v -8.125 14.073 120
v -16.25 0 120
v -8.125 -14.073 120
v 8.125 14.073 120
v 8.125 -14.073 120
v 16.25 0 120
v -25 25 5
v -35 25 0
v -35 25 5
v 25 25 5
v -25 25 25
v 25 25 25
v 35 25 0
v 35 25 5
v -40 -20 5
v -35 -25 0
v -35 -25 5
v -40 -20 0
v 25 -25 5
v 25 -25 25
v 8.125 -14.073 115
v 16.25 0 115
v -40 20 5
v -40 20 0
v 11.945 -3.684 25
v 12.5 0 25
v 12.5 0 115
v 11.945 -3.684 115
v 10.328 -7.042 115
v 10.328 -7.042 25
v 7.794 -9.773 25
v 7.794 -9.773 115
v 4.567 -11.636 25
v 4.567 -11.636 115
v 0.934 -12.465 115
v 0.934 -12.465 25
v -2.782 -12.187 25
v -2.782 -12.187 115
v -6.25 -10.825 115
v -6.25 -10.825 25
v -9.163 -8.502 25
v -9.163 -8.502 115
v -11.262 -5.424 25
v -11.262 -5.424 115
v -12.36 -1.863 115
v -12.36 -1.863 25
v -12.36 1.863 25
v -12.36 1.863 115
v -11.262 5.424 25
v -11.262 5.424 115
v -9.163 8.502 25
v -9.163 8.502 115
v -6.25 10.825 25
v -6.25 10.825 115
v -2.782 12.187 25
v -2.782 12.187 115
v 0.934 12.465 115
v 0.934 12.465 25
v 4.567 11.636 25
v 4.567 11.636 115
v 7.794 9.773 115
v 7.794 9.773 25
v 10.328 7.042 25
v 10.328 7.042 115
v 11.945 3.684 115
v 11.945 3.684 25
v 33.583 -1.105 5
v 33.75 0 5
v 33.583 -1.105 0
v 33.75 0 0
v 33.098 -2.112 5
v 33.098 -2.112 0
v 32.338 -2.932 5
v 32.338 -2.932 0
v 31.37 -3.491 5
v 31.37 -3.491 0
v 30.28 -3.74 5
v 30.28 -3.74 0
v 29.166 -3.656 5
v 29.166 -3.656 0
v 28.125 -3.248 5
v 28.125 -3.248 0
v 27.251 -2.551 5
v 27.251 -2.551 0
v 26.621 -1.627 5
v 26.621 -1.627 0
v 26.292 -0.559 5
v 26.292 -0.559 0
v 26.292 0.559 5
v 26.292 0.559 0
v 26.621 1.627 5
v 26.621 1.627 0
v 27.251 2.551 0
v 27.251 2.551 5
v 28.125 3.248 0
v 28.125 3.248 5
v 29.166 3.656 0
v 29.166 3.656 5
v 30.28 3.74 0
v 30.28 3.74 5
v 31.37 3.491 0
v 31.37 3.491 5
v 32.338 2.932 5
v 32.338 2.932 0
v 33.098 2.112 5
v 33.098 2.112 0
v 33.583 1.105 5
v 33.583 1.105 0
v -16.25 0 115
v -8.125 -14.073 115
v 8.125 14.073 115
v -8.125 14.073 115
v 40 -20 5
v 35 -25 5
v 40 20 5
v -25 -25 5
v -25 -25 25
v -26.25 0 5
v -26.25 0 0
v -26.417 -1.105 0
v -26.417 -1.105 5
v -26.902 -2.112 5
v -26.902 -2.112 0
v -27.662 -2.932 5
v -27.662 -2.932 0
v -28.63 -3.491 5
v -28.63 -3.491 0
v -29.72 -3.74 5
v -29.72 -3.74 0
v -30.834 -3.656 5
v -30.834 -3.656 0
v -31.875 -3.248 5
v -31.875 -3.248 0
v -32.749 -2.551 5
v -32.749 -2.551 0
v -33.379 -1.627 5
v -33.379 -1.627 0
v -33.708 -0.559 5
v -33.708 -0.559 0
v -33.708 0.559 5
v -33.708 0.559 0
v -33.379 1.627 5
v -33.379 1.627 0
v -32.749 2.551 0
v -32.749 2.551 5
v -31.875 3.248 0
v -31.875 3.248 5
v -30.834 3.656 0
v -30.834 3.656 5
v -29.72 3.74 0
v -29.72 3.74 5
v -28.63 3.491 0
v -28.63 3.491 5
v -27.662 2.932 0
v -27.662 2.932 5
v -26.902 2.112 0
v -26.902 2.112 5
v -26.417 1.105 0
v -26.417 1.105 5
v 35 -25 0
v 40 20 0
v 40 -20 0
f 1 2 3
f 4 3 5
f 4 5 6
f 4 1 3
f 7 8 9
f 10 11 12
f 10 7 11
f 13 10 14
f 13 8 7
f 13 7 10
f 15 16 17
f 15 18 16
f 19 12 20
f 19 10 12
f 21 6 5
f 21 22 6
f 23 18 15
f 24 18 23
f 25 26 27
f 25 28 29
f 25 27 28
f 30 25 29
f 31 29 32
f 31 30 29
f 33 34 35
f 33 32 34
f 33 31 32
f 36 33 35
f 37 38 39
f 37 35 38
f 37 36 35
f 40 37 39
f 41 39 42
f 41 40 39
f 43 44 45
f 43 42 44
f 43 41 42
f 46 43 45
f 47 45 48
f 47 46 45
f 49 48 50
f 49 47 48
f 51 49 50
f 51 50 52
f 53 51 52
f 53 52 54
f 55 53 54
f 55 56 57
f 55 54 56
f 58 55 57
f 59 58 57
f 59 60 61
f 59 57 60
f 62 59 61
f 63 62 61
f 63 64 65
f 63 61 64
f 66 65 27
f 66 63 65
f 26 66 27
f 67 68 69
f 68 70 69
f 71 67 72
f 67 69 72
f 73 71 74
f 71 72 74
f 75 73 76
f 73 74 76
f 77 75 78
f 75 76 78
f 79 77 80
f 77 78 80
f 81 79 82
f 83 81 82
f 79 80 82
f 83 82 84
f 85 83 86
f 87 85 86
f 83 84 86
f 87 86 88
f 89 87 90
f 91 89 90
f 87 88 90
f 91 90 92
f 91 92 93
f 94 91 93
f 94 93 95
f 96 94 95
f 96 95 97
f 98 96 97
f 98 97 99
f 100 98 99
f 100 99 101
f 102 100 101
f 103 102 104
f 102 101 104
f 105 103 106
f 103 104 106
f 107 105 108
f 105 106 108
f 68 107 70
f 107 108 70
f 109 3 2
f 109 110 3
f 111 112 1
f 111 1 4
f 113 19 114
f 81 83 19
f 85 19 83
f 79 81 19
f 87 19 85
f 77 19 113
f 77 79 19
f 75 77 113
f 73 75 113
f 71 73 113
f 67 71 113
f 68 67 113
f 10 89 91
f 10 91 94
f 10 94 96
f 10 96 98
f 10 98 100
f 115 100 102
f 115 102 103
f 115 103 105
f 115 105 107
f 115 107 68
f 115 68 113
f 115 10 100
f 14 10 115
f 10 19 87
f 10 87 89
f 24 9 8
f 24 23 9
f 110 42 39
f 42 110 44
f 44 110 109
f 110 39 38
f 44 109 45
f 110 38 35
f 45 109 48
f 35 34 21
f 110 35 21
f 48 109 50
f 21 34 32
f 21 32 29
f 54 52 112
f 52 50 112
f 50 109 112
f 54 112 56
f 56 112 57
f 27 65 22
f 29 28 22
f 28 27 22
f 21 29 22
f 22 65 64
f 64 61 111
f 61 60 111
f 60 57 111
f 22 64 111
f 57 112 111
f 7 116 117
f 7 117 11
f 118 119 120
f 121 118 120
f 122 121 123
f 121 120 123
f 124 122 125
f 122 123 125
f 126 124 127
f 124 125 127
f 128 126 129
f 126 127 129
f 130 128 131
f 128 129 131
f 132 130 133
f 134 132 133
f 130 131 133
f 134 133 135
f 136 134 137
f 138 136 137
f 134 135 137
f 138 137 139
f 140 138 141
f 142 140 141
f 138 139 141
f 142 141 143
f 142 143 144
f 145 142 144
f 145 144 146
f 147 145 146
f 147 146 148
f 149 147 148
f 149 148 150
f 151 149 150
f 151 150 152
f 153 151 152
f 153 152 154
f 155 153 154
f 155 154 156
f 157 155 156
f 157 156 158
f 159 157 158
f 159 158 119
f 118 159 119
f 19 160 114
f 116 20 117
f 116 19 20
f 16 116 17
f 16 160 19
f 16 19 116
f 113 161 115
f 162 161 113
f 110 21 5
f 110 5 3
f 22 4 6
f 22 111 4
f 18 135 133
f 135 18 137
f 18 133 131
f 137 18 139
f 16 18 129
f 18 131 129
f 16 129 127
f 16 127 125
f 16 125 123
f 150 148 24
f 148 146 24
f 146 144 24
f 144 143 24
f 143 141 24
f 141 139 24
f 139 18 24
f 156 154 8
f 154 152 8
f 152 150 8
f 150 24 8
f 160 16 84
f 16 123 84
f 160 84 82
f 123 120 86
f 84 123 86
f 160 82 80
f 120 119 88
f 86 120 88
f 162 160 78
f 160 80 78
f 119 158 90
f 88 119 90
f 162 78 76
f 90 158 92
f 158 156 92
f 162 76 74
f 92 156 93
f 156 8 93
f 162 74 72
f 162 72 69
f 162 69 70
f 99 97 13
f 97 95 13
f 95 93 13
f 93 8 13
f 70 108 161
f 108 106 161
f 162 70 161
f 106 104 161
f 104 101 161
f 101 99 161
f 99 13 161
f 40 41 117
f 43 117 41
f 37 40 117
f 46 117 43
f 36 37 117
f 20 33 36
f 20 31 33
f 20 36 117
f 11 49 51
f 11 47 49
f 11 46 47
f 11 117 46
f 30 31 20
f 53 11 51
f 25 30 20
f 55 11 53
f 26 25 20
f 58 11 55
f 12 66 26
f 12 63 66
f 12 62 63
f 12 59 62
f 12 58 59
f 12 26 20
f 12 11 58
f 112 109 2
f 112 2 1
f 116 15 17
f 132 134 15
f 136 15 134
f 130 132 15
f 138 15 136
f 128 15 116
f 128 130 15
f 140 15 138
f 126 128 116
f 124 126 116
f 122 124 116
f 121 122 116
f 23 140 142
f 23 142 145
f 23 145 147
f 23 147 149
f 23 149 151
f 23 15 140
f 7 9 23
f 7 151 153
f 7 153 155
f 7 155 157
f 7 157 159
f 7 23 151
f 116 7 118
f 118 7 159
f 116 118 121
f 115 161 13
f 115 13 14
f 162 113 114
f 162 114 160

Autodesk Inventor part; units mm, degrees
ref_plane "YZ Plane" through (0, 0, 0) normal (1, 0, 0) x (0, 1, 0)
ref_plane "XZ Plane" through (0, 0, 0) normal (0, 1, 0) x (-1, 0, 0)
ref_plane "XY Plane" through (0, 0, 0) normal (0, 0, 1) x (1, 0, 0)
sketch "Sketch1" plane through (0, 0, 0) normal (0, 0, 1) x (1, 0, 0)
  line L0 (-40, 25) -> (40, 25)
  line L1 (40, 25) -> (40, -25)
  line L2 (40, -25) -> (-40, -25)
  line L3 (-40, -25) -> (-40, 25)
  line L4 (-40, 25) -> (40, -25) construction
  line L5 (40, 25) -> (-40, -25) construction
  point P0 (0, 0)
  dimension "d0" = 80
  dimension "d1" = 50
extrude "Extrusion1" add sketch "Sketch1" along normal blind 5
sketch "Sketch2" plane through (0, 0, 0) normal (0, 0, 1) x (1, 0, 0)
  line L0 (0, 0) -> (-30, 0) construction
  line L1 (0, 0) -> (30, 0) construction
  circle A0 centre (-30, 0) radius 3.75
  circle A1 centre (30, 0) radius 3.75
  dimension "d4" = 30
  dimension "d5" = 30
  dimension "d6" = 7.5
  dimension "d7" = 7.5
extrude "Extrusion2" cut sketch "Sketch2" along normal through all
sketch "Sketch3" plane through (0, 0, 0) normal (0, 0, 1) x (1, 0, 0)
  line L0 (-25, 25) -> (25, 25)
  line L1 (25, 25) -> (25, -25)
  line L2 (25, -25) -> (-25, -25)
  line L3 (-25, -25) -> (-25, 25)
  line L4 (-25, 25) -> (25, -25) construction
  line L5 (25, 25) -> (-25, -25) construction
  point P0 (0, 0)
  dimension "d10" = 50
  dimension "d11" = 50
extrude "Extrusion3" add sketch "Sketch3" along normal blind 25
sketch "Sketch4" plane through (0, 0, 25) normal (0, 0, 1) x (1, 0, 0)
  circle A0 centre (0, 0) radius 12.5
  dimension "d14" = 25
extrude "Extrusion4" add sketch "Sketch4" along normal blind 90
sketch "Sketch5" plane through (0, 0, 115) normal (0, 0, 1) x (1, 0, 0)
  circle A0 centre (0, 0) radius 16.25 construction
  line L0 (16.25, 0) -> (8.125, -14.0729)
  line L1 (8.125, -14.0729) -> (-8.125, -14.0729)
  line L2 (-8.125, -14.0729) -> (-16.25, 0)
  line L3 (-16.25, 0) -> (-8.125, 14.0729)
  line L4 (-8.125, 14.0729) -> (8.125, 14.0729)
  line L5 (8.125, 14.0729) -> (16.25, 0)
  dimension "d17" = 32.5
extrude "Extrusion5" add sketch "Sketch5" along normal blind 5
chamfer "Chamfer1" distance 5 angle 45 4 edges at (40, -25, 2.5) (40, 25, 2.5) (-40, -25, 2.5) (-40, 25, 2.5)
properties part number "UpperArm"
